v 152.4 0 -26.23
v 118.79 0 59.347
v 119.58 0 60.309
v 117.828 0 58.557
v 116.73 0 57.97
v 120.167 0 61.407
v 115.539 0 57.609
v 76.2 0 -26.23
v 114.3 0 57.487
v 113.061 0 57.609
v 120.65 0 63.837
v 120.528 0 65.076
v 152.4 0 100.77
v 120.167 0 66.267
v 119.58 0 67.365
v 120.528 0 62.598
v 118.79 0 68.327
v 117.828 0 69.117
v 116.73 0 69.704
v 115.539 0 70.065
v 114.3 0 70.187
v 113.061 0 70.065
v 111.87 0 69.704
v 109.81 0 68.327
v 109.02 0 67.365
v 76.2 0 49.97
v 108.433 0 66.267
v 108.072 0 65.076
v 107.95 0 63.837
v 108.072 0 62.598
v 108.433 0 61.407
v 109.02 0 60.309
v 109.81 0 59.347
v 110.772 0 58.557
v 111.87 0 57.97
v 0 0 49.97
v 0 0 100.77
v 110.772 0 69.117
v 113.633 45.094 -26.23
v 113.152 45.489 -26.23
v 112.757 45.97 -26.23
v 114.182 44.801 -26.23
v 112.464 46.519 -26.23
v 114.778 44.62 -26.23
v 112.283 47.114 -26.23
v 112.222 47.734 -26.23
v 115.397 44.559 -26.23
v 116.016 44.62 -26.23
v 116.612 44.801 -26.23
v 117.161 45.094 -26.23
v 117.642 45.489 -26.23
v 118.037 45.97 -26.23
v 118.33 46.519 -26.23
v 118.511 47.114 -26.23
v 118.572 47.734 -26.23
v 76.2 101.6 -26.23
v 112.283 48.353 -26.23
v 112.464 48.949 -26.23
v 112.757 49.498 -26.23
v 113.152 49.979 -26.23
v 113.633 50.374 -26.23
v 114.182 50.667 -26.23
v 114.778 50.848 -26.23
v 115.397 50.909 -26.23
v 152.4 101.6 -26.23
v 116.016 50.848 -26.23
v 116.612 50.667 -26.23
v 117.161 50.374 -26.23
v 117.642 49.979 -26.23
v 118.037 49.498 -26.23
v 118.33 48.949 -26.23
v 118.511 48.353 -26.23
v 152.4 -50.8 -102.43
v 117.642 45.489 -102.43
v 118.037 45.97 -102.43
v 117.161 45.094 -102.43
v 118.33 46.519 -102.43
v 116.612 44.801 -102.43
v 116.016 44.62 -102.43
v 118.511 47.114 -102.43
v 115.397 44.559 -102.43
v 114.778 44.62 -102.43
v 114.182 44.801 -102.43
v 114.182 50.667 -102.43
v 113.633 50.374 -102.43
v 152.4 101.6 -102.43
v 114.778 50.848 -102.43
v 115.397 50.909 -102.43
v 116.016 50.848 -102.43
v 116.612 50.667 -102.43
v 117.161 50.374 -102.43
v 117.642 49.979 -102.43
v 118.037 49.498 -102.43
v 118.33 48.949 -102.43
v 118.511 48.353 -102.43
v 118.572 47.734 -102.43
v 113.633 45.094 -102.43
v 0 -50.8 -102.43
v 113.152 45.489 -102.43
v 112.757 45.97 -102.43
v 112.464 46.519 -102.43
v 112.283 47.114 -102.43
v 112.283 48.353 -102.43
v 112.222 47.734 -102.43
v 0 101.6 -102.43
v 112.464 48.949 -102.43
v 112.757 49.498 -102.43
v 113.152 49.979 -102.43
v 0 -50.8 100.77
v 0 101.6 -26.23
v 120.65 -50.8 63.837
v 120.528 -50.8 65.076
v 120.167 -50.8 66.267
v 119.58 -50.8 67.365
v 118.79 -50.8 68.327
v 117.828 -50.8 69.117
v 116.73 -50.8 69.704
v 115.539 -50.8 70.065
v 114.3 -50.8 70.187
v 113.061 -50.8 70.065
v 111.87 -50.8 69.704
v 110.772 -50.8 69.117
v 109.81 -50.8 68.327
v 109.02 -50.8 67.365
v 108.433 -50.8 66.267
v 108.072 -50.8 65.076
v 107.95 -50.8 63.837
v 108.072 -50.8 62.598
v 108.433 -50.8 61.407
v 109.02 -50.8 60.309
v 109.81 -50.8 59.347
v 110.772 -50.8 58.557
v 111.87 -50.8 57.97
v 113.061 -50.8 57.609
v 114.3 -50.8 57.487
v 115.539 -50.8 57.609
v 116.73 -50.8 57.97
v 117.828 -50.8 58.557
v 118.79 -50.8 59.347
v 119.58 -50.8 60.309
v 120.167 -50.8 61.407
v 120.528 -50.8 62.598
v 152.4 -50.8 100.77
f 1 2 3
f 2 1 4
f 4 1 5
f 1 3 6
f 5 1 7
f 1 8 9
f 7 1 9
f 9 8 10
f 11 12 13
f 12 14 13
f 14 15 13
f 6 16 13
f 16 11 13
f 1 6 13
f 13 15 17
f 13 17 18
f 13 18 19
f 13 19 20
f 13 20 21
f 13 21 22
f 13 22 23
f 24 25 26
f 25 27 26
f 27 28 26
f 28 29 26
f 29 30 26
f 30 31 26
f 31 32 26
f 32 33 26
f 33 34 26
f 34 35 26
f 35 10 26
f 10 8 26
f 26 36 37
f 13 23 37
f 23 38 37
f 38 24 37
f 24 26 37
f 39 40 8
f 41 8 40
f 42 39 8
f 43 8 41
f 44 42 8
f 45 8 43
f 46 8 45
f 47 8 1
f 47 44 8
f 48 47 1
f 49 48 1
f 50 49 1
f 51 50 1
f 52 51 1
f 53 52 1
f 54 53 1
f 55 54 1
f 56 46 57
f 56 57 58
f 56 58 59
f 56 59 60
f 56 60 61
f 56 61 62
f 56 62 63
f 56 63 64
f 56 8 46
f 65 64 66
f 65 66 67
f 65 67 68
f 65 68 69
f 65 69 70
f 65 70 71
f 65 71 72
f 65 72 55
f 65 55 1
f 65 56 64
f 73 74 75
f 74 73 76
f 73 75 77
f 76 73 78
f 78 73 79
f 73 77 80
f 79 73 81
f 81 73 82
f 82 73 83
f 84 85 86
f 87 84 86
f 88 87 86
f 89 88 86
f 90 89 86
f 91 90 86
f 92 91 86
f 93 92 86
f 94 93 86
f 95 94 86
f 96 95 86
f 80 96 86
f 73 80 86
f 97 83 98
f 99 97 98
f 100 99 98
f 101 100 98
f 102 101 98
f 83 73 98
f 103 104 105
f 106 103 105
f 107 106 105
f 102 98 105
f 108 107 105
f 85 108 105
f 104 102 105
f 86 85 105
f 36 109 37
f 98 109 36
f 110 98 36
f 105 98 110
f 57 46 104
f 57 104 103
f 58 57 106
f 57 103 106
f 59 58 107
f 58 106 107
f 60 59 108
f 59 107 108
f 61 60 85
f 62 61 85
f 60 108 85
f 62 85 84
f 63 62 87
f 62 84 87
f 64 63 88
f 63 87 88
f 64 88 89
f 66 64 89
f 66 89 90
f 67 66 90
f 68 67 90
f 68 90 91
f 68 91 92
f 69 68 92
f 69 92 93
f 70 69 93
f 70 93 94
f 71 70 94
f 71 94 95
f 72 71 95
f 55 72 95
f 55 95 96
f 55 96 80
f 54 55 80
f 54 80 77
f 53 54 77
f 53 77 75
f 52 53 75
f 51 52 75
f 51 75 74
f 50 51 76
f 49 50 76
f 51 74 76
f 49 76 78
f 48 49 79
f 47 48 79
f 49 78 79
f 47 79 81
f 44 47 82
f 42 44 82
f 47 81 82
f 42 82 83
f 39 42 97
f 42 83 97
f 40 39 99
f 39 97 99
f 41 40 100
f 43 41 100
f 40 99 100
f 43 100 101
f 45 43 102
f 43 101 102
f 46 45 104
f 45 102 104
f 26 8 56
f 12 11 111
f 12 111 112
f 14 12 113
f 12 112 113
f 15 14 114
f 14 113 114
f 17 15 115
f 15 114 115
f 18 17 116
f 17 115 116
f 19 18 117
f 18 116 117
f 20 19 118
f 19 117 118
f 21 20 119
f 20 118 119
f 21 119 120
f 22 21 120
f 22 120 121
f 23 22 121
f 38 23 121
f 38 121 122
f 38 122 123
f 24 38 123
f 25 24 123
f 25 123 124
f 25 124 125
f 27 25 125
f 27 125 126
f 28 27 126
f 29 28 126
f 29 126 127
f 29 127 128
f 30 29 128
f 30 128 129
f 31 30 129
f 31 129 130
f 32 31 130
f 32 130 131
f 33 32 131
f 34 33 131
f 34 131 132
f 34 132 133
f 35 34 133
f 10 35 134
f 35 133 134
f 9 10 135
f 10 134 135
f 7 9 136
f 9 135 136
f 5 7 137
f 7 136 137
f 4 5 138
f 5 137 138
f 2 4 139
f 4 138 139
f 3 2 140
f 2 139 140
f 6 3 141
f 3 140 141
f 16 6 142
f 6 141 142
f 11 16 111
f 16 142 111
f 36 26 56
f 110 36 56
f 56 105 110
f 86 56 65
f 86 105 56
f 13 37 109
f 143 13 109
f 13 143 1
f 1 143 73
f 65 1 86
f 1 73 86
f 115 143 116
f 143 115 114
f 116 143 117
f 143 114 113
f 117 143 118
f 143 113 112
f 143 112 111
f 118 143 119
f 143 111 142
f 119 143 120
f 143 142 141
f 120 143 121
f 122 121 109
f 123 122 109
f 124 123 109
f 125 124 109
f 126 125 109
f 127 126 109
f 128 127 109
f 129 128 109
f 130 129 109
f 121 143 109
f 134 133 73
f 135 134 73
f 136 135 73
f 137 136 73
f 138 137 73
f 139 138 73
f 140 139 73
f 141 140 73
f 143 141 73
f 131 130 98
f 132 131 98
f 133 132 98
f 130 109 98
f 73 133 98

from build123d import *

# Parameters (mm, degrees)
F1_DEPTH = 152.4
F2_W     = 101.6
F2_H     = 76.2
F3_DEPTH = 25.4
F4_W     = 76.2
F4_H     = 101.6
F5_DEPTH = 76.2
F7_D     = 6.35
F9_DEPTH = 76.2
F11_D    = 12.7


with BuildPart() as f1:
    # F0 (on Right) → F1 (new body)
    with BuildSketch(Plane.YZ):
        Polygon((0, 100.770188), (-50.8, 100.770188), (-50.8, -102.429812), (101.6, -102.429812), (101.6, -51.629812), (0, -51.629812), align=None)
    extrude(amount=F1_DEPTH)

    # F2 (on face) → F3 (join)
    with BuildSketch(Plane.XY.offset(-51.629812)):
        with Locations((101.6, 63.5)):
            Rectangle(F2_W, F2_H)
        Polygon((152.4, 25.4), (50.8, 25.4), (50.8, 101.6), (0, 101.6), (0, 0), (152.4, 0), align=None)
    extrude(amount=F3_DEPTH)

    # F4 (on face) → F5 (join)
    with BuildSketch(Plane.XY.offset(-26.229812)):
        with Locations((38.1, 50.8)):
            Rectangle(F4_W, F4_H)
    extrude(amount=F5_DEPTH)

    # F7 (through all)
    with Locations(Plane.XY.offset(-26.229812)):
        with Locations((115.396917, 47.733858)):
            Hole(F7_D / 2)

    # F8 (on face) → F9 (cut)
    with BuildSketch(Plane.YZ.offset(76.2)):
        Polygon((101.6, 49.970188), (0, 49.970188), (101.6, -26.229812), align=None)
    extrude(amount=-F9_DEPTH, mode=Mode.SUBTRACT)

    # F11 (through all)
    with Locations(Plane(origin=(0, 0, 0), x_dir=(-1, 0, 0), z_dir=(0, 1, 0))):
        with Locations((-114.3, 63.836917)):
            Hole(F11_D / 2)


solid = f1.part
